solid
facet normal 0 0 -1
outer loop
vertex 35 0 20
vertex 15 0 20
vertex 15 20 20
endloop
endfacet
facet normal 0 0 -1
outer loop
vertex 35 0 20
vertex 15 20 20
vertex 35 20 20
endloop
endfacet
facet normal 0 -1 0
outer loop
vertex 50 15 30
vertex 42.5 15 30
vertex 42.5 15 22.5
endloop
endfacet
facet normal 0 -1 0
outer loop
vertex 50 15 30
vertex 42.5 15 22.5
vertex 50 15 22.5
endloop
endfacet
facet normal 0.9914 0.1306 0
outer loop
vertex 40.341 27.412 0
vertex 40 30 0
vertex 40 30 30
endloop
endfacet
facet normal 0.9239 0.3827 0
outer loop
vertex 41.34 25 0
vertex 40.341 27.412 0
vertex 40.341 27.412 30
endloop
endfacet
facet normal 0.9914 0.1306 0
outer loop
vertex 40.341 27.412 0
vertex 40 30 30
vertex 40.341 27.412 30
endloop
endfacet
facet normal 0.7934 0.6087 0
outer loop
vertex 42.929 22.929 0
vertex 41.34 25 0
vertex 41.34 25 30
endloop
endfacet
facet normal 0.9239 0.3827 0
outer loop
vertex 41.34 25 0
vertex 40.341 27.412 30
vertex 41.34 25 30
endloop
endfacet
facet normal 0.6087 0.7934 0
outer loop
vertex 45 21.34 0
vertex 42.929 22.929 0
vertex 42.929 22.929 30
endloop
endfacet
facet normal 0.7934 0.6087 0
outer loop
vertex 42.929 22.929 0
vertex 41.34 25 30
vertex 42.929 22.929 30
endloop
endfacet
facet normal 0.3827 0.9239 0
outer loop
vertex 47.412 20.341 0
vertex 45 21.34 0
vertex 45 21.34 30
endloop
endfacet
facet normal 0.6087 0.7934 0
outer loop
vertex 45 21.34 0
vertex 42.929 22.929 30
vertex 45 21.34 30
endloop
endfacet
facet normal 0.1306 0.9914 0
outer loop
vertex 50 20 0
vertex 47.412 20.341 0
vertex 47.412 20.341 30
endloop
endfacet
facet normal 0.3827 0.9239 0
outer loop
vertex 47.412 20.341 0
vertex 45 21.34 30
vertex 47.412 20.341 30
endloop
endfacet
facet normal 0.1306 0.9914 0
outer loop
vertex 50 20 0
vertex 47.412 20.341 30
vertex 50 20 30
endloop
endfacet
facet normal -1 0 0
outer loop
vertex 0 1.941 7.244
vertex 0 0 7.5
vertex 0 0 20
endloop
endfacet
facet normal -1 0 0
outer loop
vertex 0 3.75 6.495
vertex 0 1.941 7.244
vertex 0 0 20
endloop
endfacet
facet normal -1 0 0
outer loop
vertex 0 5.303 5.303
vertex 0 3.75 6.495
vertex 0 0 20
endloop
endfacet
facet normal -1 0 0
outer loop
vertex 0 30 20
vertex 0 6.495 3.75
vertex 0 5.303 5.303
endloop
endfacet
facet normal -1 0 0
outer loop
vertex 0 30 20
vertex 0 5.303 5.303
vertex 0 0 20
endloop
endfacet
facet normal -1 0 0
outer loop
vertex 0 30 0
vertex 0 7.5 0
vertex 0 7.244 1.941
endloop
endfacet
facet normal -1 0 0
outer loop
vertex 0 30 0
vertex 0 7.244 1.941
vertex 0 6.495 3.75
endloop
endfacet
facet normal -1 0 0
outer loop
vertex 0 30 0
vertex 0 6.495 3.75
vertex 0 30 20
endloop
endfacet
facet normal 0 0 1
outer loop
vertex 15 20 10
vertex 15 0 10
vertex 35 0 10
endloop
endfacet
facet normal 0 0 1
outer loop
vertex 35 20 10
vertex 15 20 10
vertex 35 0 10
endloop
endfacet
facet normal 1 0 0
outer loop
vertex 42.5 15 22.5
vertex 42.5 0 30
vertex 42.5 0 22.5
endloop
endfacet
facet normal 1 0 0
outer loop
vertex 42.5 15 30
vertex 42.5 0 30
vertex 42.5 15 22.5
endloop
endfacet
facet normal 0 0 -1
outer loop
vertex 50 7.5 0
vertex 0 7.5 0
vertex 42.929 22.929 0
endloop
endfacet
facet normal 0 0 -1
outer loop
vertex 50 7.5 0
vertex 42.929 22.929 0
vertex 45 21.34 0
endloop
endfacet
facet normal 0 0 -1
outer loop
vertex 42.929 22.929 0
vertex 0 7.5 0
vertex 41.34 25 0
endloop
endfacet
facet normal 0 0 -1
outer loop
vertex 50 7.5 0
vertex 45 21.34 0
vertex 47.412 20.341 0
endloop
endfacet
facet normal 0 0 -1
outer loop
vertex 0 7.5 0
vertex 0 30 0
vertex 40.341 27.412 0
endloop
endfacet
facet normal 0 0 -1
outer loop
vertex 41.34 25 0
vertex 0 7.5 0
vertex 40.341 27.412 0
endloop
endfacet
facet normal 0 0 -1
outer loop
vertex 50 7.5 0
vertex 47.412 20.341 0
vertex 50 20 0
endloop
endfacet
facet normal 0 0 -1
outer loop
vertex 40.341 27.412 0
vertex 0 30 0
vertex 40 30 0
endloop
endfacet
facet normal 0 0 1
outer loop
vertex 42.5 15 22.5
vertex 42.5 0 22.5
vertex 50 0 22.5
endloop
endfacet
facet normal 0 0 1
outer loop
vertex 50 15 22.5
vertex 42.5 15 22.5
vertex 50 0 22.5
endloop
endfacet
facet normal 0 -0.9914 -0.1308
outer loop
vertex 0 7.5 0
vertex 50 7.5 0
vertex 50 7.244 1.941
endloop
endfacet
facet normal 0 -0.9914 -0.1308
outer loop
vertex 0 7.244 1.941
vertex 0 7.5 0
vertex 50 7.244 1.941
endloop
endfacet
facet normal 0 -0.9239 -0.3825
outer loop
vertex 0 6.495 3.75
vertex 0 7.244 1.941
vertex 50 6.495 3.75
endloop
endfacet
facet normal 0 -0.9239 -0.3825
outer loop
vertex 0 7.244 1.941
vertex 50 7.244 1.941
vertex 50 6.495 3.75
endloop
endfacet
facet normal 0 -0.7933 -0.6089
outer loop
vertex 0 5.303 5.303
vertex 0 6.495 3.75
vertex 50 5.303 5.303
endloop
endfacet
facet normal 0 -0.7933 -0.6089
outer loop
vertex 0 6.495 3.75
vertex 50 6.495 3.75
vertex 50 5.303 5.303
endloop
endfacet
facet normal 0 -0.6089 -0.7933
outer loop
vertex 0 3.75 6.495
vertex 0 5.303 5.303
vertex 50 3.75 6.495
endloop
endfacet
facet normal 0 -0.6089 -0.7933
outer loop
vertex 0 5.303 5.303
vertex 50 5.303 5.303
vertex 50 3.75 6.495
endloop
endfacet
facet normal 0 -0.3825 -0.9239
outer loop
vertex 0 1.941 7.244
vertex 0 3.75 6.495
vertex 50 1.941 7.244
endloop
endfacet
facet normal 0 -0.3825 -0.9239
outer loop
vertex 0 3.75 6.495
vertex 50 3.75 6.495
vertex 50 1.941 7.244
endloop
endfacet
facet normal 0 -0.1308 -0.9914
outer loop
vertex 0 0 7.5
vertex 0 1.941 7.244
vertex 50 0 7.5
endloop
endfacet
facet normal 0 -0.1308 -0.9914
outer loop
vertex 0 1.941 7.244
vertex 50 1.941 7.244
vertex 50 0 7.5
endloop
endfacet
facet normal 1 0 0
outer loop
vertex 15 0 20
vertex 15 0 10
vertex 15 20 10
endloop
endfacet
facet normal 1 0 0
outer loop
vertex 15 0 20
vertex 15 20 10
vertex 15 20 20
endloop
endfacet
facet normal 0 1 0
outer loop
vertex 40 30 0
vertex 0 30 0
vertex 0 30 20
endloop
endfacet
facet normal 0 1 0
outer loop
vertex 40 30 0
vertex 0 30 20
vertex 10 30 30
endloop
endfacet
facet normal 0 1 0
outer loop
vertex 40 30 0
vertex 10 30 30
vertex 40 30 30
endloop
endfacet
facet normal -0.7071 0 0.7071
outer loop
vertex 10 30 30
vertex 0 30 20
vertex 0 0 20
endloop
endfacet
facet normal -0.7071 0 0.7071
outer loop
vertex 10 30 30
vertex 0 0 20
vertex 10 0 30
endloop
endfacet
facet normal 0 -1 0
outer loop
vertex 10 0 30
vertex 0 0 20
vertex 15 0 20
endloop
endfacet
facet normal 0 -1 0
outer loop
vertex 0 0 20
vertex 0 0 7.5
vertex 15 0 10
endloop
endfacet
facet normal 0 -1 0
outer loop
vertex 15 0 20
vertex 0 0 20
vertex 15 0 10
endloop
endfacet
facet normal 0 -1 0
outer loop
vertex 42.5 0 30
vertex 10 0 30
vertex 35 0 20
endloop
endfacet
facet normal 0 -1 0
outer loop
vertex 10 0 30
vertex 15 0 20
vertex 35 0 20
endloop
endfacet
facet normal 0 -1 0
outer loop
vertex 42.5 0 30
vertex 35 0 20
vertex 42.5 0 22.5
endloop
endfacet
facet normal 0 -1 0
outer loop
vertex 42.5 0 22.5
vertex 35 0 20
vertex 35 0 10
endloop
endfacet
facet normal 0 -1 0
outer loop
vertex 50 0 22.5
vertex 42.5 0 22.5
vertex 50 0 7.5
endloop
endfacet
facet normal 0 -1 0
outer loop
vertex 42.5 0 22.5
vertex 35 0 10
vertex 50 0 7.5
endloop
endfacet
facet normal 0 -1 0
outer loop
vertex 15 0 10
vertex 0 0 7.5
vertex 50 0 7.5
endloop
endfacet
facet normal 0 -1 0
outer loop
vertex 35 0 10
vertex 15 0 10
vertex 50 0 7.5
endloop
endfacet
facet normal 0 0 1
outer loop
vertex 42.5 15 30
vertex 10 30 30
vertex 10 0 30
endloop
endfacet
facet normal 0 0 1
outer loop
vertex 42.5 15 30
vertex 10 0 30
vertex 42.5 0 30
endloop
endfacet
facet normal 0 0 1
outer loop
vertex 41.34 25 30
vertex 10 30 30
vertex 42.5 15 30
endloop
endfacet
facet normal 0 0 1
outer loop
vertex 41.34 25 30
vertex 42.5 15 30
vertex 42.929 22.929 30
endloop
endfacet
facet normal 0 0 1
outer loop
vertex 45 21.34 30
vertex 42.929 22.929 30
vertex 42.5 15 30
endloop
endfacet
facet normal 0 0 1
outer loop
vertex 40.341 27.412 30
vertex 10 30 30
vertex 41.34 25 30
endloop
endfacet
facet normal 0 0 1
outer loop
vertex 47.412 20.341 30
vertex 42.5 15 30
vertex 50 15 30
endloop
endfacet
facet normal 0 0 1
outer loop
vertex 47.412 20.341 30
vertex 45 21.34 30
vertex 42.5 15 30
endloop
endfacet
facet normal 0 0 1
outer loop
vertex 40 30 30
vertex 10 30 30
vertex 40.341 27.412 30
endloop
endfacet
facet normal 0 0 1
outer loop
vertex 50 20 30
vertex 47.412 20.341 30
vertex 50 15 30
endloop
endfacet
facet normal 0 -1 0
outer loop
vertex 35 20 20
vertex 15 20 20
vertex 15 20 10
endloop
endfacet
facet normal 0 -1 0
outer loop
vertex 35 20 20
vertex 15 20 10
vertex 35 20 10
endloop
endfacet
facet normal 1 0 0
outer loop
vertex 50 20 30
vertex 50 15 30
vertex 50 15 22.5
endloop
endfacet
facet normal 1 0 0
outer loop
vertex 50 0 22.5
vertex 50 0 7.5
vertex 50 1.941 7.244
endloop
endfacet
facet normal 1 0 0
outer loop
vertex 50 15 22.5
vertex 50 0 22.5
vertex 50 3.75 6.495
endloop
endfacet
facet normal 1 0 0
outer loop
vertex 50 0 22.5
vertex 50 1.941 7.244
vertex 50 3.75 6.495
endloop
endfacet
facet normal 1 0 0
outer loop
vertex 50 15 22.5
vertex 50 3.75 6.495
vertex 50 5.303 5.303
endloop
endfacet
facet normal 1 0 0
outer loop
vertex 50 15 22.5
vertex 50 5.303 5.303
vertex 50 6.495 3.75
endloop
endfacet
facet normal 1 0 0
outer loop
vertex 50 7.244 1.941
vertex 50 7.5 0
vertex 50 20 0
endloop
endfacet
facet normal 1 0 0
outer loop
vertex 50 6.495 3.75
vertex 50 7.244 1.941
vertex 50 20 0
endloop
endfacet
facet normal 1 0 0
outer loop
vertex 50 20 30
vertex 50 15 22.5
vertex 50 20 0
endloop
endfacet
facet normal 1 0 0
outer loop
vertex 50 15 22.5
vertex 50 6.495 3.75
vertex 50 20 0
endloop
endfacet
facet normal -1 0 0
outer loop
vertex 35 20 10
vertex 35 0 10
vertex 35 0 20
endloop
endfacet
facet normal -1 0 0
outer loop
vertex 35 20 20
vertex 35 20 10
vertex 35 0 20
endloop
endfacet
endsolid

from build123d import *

# Parameters (mm, degrees)
F0_W      = 50
F0_H      = 30
F1_DEPTH  = 30
F3_DEPTH  = 30.001
F4_W      = 20
F4_H      = 10
F5_DEPTH  = 20
F6_R      = 10
F7_DEPTH  = 30.001
F8_W      = 7.5
F8_H      = 15
F9_DEPTH  = 7.5
F10_R     = 7.5
F11_DEPTH = 50.001


with BuildPart() as f1:
    # F0 (on Top) → F1 (new body)
    with BuildSketch(Plane.XY):
        with Locations((25, 15)):
            Rectangle(F0_W, F0_H)
    extrude(amount=F1_DEPTH)

    # F2 (on face) → F3 (cut, through all)
    with BuildSketch(Plane.XZ):
        Polygon((10, 30), (0, 30), (0, 20), align=None)
    extrude(amount=-F3_DEPTH, mode=Mode.SUBTRACT)

    # F4 (on face) → F5 (cut)
    with BuildSketch(Plane.XZ):
        with Locations((25, 15)):
            Rectangle(F4_W, F4_H)
    extrude(amount=-F5_DEPTH, mode=Mode.SUBTRACT)

    # F6 (on face) → F7 (cut, through all)
    with BuildSketch(Plane.XY.offset(30)):
        with Locations((50, 30)):
            Circle(F6_R)
    extrude(amount=-F7_DEPTH, mode=Mode.SUBTRACT)

    # F8 (on face) → F9 (cut)
    with BuildSketch(Plane.XY.offset(30)):
        with Locations((46.25, 7.5)):
            Rectangle(F8_W, F8_H)
    extrude(amount=-F9_DEPTH, mode=Mode.SUBTRACT)

    # F10 (on face) → F11 (cut, through all)
    with BuildSketch(Plane.YZ.offset(50)):
        Circle(F10_R)
    extrude(amount=-F11_DEPTH, mode=Mode.SUBTRACT)


solid = f1.part
